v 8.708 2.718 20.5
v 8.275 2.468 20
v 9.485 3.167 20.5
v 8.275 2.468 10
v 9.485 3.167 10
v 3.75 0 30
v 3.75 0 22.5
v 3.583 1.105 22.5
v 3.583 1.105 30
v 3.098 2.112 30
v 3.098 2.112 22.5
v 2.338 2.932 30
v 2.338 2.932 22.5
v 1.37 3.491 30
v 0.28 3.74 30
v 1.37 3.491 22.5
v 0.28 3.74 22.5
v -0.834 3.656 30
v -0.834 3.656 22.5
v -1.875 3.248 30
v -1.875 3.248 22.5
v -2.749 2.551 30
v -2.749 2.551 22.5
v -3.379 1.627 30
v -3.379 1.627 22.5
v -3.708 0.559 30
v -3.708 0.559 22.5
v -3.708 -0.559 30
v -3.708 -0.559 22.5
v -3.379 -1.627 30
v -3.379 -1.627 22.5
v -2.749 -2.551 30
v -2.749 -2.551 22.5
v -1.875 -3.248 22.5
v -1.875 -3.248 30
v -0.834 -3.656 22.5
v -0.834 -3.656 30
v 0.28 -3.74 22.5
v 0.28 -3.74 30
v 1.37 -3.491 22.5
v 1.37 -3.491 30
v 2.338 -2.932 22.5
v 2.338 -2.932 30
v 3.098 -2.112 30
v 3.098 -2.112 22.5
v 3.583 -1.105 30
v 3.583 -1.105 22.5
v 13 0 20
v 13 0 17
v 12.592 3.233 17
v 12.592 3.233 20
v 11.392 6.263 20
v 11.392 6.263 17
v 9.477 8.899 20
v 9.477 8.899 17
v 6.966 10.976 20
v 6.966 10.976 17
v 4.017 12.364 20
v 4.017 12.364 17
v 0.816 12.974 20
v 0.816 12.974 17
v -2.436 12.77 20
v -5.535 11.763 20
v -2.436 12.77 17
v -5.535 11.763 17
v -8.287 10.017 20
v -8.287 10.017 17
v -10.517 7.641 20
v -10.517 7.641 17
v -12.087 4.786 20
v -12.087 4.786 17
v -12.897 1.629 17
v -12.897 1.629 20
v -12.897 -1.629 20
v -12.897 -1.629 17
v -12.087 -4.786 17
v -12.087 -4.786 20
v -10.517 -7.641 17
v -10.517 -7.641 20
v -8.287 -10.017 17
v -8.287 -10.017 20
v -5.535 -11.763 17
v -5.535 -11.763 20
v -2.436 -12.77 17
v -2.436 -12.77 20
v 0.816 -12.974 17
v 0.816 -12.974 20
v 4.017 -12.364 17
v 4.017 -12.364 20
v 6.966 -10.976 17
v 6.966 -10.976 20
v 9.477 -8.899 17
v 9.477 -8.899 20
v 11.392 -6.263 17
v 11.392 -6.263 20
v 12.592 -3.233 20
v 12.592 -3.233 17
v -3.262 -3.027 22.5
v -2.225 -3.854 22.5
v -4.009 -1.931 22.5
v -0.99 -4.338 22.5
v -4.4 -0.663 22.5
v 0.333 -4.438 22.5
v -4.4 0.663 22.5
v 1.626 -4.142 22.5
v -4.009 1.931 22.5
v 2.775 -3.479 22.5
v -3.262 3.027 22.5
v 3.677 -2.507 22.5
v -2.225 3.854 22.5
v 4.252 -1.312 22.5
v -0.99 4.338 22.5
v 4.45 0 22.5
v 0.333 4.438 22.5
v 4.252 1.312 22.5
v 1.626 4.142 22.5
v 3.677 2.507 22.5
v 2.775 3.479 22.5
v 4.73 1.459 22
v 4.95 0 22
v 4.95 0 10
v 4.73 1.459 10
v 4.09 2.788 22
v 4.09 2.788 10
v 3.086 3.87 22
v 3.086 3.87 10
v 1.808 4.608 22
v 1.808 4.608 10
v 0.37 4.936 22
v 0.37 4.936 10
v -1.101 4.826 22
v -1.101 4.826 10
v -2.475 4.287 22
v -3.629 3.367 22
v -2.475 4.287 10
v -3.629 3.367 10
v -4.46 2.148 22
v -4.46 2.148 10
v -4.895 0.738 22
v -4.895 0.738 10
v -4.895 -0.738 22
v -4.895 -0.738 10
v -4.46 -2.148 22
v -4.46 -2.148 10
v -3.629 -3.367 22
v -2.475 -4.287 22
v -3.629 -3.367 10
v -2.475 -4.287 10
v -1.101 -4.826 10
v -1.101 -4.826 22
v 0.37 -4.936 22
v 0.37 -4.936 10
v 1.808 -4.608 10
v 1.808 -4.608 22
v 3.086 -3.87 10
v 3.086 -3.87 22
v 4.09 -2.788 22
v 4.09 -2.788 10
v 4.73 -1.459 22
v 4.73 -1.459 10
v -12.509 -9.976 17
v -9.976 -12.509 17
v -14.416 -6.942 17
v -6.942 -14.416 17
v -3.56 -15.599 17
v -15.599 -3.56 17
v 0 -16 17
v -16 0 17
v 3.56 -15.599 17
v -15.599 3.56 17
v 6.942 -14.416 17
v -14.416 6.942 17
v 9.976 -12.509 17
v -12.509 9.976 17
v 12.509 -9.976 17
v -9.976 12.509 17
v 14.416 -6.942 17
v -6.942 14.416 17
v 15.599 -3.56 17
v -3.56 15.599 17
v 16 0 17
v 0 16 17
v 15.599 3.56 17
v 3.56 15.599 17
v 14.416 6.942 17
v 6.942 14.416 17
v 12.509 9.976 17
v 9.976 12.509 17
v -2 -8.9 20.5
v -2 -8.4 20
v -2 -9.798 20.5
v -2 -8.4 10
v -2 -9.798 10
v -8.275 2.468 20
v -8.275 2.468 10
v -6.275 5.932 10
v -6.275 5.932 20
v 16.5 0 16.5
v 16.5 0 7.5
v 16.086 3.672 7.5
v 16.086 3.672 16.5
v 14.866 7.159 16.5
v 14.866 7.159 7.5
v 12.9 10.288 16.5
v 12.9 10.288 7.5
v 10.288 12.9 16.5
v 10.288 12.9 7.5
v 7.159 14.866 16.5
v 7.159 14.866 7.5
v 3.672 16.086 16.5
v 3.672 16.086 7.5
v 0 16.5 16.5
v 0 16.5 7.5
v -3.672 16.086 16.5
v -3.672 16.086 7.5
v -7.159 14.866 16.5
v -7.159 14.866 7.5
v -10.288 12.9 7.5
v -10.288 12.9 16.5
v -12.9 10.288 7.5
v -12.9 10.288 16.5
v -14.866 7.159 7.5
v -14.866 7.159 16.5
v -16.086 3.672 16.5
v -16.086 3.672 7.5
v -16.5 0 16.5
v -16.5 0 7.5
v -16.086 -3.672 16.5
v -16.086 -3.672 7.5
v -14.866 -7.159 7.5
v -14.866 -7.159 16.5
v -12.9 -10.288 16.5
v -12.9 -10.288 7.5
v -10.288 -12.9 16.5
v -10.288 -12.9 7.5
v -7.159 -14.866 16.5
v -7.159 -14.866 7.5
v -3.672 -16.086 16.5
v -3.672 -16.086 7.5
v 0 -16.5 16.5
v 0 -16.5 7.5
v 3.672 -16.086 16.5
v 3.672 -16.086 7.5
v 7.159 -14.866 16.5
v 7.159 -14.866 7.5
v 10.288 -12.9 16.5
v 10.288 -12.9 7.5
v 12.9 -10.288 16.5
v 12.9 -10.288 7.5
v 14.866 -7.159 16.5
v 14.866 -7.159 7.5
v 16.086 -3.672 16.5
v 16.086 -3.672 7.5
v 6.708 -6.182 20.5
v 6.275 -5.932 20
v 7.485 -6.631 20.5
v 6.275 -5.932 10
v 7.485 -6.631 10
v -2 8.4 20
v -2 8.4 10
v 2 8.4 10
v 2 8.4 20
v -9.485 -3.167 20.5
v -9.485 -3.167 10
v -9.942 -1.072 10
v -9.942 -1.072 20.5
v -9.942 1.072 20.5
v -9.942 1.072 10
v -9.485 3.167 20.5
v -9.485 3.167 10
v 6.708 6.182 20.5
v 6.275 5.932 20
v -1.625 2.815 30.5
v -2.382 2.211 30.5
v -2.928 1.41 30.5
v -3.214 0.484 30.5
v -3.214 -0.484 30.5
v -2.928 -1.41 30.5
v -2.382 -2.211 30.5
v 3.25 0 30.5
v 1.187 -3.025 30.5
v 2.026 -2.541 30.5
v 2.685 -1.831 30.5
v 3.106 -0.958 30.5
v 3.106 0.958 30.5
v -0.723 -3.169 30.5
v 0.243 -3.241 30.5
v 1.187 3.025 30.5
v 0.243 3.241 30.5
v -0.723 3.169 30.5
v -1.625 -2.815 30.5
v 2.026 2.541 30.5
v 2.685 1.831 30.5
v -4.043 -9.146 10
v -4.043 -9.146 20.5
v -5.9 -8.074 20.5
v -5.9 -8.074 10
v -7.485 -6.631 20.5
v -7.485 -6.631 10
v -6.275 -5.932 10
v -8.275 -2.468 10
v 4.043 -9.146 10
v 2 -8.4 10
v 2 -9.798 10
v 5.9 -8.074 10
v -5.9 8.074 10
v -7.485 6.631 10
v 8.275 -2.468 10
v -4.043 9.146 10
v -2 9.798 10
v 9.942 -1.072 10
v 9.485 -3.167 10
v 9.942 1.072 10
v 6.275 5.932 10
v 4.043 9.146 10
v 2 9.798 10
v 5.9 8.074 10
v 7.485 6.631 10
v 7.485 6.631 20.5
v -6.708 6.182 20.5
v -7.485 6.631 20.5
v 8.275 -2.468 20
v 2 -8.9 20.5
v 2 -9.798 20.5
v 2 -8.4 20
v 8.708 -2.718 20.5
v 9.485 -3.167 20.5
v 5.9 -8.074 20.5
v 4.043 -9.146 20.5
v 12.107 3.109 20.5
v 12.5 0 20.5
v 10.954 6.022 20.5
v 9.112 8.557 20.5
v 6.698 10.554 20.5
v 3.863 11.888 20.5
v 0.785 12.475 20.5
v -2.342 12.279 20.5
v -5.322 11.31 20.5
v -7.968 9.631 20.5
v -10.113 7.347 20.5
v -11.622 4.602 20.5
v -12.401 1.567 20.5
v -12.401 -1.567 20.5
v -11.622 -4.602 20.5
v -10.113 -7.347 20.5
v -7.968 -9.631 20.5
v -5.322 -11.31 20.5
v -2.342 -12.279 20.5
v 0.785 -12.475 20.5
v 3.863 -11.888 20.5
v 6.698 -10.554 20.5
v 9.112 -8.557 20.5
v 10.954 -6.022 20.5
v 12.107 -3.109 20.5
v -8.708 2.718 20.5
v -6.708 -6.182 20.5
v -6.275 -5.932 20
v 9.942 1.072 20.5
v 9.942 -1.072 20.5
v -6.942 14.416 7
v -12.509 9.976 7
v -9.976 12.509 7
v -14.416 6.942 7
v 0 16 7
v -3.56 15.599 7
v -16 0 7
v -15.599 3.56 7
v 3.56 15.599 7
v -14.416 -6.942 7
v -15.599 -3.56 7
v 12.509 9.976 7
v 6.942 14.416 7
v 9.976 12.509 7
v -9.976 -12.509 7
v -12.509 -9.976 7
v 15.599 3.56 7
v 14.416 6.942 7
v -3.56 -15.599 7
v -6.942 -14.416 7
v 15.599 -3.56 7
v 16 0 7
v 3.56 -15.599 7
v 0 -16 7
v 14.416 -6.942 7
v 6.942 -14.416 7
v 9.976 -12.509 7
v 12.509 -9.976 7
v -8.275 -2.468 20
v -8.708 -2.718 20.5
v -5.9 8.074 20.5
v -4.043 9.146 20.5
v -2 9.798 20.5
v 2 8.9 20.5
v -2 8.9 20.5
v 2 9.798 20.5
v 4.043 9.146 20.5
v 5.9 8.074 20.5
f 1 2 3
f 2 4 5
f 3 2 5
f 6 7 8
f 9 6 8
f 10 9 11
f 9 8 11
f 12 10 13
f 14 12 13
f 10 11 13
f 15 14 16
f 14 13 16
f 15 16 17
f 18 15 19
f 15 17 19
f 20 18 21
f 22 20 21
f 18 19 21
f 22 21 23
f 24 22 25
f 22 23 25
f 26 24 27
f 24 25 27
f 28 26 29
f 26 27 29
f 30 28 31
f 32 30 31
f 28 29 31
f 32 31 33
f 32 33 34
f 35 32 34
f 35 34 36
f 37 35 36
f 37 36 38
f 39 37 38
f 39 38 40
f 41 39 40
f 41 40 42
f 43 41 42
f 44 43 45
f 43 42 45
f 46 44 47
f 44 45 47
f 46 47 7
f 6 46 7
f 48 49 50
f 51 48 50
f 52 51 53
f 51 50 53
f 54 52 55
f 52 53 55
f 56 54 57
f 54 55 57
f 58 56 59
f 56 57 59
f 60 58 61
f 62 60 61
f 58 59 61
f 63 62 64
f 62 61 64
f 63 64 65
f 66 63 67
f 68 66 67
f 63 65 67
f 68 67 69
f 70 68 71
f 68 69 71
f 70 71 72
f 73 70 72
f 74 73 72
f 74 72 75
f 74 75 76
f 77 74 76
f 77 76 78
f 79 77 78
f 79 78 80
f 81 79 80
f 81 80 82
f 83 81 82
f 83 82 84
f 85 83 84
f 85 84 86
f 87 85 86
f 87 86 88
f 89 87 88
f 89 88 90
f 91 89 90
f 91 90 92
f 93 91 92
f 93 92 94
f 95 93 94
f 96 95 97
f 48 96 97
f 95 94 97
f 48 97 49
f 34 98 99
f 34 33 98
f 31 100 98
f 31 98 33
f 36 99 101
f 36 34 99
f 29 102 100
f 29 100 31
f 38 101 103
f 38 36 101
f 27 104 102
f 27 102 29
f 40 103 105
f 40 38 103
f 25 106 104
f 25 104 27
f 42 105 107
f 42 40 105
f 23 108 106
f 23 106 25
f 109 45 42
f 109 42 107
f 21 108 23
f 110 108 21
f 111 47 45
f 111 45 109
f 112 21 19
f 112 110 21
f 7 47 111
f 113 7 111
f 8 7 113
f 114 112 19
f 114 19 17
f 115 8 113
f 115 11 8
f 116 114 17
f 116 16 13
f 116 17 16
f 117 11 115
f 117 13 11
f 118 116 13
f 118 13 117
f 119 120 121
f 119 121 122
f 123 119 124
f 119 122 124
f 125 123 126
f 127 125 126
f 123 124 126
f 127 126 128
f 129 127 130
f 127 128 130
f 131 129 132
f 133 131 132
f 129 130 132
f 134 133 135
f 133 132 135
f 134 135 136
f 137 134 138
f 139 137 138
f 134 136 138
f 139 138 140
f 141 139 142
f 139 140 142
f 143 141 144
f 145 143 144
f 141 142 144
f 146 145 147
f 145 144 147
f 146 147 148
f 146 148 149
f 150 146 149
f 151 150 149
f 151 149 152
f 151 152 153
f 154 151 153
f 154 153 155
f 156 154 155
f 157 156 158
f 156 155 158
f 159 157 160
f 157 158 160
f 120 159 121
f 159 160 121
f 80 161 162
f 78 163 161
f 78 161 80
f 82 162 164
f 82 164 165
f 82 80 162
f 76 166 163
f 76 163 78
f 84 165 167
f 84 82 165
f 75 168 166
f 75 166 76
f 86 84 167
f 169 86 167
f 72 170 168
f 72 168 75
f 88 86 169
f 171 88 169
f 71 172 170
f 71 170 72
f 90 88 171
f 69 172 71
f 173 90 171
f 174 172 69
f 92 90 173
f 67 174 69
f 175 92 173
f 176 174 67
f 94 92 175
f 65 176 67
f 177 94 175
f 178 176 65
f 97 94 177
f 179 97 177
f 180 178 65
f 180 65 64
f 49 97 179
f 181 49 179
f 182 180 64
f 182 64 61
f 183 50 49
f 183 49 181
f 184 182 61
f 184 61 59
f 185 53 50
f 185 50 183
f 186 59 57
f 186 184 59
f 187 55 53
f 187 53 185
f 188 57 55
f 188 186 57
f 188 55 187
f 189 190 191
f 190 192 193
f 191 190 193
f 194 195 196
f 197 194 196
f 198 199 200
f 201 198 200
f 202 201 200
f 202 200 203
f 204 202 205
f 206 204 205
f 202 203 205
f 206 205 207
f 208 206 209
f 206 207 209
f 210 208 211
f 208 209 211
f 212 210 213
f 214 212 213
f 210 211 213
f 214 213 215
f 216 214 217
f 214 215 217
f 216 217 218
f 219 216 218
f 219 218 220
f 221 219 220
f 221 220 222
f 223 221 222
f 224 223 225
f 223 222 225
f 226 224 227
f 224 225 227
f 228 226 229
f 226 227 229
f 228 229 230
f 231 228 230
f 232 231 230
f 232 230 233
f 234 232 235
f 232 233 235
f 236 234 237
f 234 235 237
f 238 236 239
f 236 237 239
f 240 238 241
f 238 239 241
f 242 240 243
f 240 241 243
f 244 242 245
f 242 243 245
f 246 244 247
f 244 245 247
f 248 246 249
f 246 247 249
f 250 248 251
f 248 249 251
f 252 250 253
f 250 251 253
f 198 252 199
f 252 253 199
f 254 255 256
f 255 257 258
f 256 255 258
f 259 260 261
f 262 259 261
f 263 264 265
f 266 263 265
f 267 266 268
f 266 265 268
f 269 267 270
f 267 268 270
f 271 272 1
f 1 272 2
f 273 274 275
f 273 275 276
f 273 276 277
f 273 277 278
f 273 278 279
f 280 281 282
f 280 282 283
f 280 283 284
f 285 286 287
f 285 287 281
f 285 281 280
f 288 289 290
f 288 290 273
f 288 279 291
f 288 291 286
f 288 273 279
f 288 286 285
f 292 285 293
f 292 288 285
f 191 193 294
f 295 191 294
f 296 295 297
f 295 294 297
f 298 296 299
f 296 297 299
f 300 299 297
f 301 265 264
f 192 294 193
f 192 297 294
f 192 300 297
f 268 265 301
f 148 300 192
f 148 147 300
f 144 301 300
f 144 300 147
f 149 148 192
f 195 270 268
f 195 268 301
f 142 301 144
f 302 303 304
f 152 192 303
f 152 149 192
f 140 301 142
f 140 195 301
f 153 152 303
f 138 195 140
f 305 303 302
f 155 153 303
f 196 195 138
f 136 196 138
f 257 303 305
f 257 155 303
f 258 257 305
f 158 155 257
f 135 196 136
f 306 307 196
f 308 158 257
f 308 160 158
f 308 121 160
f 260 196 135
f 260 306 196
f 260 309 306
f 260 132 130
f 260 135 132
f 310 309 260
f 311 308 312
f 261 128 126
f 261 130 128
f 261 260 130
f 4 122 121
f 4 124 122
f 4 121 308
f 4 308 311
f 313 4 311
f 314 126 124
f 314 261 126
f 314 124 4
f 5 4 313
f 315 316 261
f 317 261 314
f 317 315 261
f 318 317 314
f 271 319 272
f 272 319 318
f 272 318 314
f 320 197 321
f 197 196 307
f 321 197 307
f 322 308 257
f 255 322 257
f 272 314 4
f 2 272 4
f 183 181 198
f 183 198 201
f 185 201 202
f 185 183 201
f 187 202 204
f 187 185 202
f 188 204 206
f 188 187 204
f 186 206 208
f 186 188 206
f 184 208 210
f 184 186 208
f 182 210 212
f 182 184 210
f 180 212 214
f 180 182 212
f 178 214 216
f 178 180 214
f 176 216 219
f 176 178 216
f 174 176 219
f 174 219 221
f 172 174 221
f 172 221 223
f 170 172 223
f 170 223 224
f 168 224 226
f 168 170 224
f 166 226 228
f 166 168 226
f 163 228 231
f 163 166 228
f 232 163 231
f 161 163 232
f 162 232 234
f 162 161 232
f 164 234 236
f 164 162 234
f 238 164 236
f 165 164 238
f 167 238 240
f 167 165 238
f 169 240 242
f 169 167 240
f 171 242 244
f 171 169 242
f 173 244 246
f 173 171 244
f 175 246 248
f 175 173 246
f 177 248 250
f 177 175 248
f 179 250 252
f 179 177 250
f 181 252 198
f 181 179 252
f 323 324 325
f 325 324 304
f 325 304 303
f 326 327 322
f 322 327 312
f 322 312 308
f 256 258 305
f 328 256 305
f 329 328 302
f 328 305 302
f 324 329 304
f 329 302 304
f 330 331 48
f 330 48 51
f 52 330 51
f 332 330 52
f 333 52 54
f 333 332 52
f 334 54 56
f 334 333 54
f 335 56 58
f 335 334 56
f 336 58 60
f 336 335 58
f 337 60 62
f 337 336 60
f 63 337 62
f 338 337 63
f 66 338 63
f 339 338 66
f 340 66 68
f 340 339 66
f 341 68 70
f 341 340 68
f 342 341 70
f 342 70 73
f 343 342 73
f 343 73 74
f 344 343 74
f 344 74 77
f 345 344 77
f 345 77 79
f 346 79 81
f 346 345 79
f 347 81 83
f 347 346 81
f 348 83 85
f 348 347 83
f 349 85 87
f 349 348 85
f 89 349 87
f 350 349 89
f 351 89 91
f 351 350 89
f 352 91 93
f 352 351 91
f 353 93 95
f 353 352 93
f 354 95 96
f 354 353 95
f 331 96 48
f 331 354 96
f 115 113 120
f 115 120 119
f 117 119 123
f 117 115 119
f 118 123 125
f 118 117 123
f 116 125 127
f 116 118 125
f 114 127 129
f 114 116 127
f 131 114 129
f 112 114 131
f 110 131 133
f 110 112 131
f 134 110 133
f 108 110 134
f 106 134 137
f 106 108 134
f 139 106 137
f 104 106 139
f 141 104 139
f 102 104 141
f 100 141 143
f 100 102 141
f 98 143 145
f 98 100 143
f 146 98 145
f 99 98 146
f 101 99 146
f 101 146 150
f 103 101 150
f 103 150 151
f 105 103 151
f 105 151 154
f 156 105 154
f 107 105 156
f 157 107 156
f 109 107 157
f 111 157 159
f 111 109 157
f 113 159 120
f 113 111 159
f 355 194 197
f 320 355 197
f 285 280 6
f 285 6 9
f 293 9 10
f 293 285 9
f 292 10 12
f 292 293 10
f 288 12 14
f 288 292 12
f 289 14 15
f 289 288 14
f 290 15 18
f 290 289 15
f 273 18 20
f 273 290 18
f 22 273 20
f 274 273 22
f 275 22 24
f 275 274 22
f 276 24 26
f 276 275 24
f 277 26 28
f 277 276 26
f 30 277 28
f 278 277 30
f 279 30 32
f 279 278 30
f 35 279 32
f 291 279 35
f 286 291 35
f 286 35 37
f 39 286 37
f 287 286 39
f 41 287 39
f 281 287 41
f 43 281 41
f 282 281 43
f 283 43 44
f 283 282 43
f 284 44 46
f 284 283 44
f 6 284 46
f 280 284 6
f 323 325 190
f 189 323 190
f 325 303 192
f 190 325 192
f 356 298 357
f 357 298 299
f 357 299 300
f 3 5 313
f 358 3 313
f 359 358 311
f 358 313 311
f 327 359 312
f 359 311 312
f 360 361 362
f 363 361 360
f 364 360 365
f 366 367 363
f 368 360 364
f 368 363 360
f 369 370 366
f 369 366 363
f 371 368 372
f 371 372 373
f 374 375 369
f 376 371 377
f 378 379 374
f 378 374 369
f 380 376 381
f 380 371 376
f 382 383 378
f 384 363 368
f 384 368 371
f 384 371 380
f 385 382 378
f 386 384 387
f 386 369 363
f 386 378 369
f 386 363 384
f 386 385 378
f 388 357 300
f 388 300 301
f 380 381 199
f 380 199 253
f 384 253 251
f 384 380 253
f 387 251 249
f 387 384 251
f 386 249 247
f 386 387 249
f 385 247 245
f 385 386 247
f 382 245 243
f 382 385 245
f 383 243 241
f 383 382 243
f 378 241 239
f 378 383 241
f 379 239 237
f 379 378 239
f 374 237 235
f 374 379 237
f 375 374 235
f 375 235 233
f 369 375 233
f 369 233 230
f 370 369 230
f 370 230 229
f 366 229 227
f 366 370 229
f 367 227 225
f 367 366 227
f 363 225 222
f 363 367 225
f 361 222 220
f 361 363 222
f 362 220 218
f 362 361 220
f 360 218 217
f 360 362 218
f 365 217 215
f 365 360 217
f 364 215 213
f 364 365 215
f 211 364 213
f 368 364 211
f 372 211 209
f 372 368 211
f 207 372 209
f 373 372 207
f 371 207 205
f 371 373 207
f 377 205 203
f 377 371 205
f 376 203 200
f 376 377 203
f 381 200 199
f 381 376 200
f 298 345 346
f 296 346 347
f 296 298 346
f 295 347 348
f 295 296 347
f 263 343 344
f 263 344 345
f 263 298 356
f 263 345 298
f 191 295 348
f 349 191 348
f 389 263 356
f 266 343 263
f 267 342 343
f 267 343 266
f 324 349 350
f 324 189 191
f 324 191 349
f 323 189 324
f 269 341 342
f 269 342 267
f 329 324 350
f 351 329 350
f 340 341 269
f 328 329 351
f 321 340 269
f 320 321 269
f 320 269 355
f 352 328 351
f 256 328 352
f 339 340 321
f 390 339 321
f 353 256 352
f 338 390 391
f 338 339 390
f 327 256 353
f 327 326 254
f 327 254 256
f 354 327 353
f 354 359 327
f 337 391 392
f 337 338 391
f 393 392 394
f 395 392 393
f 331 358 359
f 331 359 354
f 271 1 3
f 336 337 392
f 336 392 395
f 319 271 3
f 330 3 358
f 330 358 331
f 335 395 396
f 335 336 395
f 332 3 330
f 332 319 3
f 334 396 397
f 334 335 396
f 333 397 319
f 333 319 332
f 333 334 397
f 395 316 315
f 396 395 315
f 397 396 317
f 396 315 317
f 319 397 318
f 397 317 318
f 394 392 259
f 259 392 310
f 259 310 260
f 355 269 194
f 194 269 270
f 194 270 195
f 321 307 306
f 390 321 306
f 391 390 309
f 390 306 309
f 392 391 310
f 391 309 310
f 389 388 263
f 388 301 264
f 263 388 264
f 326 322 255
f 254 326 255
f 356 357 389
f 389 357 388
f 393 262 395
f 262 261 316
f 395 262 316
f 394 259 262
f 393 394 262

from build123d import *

# Parameters (mm, degrees)
F0_R      = 16.5
F1_DEPTH  = 10
F2_R      = 13
F3_DEPTH  = 10.5
F4_SIZE   = 0.5
F5_R      = 4.95
F6_DEPTH  = 12.5
F7_SIZE   = 0.5
F8_R      = 3.75
F9_DEPTH  = 8
F10_SIZE  = 0.5
F11_R     = 16.5
F11_R_2   = 13
F12_DEPTH = 7
F13_R     = 25
F14_DEPTH = 7
F15_SIZE  = 0.5


with BuildPart() as f1:
    # F0 (on Top) → F1 (new body)
    with BuildSketch(Plane.XY):
        Circle(F0_R)
    extrude(amount=F1_DEPTH)

    # F2 (on face) → F3 (join)
    with BuildSketch(Plane.XY.offset(10)):
        Circle(F2_R)
        with BuildLine():
            ThreePointArc((-7.4852813742, 6.6310302931), (-5, 8.6602540378), (-2, 9.7979589711))
            Line((-2, 9.7979589711), (-2, 8.4))
            Line((-2, 8.4), (2, 8.4))
            Line((2, 8.4), (2, 9.7979589711))
            ThreePointArc((2, 9.7979589711), (5, 8.6602540378), (7.4852813742, 6.6310302931))
            Line((7.4852813742, 6.6310302931), (6.2746133918, 5.9320508076))
            Line((6.2746133918, 5.9320508076), (8.2746133918, 2.4679491924))
            Line((8.2746133918, 2.4679491924), (9.4852813742, 3.166928678))
            ThreePointArc((9.4852813742, 3.166928678), (10, 0), (9.4852813742, -3.166928678))
            Line((9.4852813742, -3.166928678), (8.2746133918, -2.4679491924))
            Line((8.2746133918, -2.4679491924), (6.2746133918, -5.9320508076))
            Line((6.2746133918, -5.9320508076), (7.4852813742, -6.6310302931))
            ThreePointArc((7.4852813742, -6.6310302931), (5, -8.6602540378), (2, -9.7979589711))
            Line((2, -9.7979589711), (2, -8.4))
            Line((2, -8.4), (-2, -8.4))
            Line((-2, -8.4), (-2, -9.7979589711))
            ThreePointArc((-2, -9.7979589711), (-5, -8.6602540378), (-7.4852813742, -6.6310302931))
            Line((-7.4852813742, -6.6310302931), (-6.2746133918, -5.9320508076))
            Line((-6.2746133918, -5.9320508076), (-8.2746133918, -2.4679491924))
            Line((-8.2746133918, -2.4679491924), (-9.4852813742, -3.166928678))
            ThreePointArc((-9.4852813742, -3.166928678), (-10, 0), (-9.4852813742, 3.166928678))
            Line((-9.4852813742, 3.166928678), (-8.2746133918, 2.4679491924))
            Line((-8.2746133918, 2.4679491924), (-6.2746133918, 5.9320508076))
            Line((-6.2746133918, 5.9320508076), (-7.4852813742, 6.6310302931))
        make_face(mode=Mode.SUBTRACT)
    extrude(amount=F3_DEPTH)

    # F4
    f4_edges = [f1.edges().sort_by_distance(p)[0] for p in [
        (0, 8.4, 20.5),
        (-7.274613, 4.2, 20.5),
        (-7.274613, -4.2, 20.5),
        (0, -8.4, 20.5),
        (7.274613, -4.2, 20.5),
        (7.274613, 4.2, 20.5),
    ]]
    chamfer(f4_edges, length=F4_SIZE)

    # F5 (on face) → F6 (join)
    with BuildSketch(Plane.XY.offset(10)):
        Circle(F5_R)
    extrude(amount=F6_DEPTH)

    # F7
    f7_edges = [f1.edges().sort_by_distance(p)[0] for p in [
        (-4.95, 0, 22.5),
    ]]
    chamfer(f7_edges, length=F7_SIZE)

    # F8 (on face) → F9 (join)
    with BuildSketch(Plane.XY.offset(22.5)):
        Circle(F8_R)
    extrude(amount=F9_DEPTH)

    # F10
    f10_edges = [f1.edges().sort_by_distance(p)[0] for p in [
        (-3.75, 0, 30.5),
    ]]
    chamfer(f10_edges, length=F10_SIZE)

    # F11 (on face) → F12 (join)
    with BuildSketch(Plane.XY.offset(10)):
        Circle(F11_R)
        Circle(F11_R_2, mode=Mode.SUBTRACT)
    extrude(amount=F12_DEPTH)

    # F13 (on face) → F14 (cut)
    with BuildSketch(Plane(origin=(0, 0, 0), x_dir=(1, 0, 0), z_dir=(0, 0, -1))):
        Circle(F13_R)
    extrude(amount=-F14_DEPTH, mode=Mode.SUBTRACT)

    # F15
    f15_edges = [f1.edges().sort_by_distance(p)[0] for p in [
        (-13, 0, 20.5),
        (-16.5, 0, 17),
        (-16.5, 0, 7),
    ]]
    chamfer(f15_edges, length=F15_SIZE)


solid = f1.part
